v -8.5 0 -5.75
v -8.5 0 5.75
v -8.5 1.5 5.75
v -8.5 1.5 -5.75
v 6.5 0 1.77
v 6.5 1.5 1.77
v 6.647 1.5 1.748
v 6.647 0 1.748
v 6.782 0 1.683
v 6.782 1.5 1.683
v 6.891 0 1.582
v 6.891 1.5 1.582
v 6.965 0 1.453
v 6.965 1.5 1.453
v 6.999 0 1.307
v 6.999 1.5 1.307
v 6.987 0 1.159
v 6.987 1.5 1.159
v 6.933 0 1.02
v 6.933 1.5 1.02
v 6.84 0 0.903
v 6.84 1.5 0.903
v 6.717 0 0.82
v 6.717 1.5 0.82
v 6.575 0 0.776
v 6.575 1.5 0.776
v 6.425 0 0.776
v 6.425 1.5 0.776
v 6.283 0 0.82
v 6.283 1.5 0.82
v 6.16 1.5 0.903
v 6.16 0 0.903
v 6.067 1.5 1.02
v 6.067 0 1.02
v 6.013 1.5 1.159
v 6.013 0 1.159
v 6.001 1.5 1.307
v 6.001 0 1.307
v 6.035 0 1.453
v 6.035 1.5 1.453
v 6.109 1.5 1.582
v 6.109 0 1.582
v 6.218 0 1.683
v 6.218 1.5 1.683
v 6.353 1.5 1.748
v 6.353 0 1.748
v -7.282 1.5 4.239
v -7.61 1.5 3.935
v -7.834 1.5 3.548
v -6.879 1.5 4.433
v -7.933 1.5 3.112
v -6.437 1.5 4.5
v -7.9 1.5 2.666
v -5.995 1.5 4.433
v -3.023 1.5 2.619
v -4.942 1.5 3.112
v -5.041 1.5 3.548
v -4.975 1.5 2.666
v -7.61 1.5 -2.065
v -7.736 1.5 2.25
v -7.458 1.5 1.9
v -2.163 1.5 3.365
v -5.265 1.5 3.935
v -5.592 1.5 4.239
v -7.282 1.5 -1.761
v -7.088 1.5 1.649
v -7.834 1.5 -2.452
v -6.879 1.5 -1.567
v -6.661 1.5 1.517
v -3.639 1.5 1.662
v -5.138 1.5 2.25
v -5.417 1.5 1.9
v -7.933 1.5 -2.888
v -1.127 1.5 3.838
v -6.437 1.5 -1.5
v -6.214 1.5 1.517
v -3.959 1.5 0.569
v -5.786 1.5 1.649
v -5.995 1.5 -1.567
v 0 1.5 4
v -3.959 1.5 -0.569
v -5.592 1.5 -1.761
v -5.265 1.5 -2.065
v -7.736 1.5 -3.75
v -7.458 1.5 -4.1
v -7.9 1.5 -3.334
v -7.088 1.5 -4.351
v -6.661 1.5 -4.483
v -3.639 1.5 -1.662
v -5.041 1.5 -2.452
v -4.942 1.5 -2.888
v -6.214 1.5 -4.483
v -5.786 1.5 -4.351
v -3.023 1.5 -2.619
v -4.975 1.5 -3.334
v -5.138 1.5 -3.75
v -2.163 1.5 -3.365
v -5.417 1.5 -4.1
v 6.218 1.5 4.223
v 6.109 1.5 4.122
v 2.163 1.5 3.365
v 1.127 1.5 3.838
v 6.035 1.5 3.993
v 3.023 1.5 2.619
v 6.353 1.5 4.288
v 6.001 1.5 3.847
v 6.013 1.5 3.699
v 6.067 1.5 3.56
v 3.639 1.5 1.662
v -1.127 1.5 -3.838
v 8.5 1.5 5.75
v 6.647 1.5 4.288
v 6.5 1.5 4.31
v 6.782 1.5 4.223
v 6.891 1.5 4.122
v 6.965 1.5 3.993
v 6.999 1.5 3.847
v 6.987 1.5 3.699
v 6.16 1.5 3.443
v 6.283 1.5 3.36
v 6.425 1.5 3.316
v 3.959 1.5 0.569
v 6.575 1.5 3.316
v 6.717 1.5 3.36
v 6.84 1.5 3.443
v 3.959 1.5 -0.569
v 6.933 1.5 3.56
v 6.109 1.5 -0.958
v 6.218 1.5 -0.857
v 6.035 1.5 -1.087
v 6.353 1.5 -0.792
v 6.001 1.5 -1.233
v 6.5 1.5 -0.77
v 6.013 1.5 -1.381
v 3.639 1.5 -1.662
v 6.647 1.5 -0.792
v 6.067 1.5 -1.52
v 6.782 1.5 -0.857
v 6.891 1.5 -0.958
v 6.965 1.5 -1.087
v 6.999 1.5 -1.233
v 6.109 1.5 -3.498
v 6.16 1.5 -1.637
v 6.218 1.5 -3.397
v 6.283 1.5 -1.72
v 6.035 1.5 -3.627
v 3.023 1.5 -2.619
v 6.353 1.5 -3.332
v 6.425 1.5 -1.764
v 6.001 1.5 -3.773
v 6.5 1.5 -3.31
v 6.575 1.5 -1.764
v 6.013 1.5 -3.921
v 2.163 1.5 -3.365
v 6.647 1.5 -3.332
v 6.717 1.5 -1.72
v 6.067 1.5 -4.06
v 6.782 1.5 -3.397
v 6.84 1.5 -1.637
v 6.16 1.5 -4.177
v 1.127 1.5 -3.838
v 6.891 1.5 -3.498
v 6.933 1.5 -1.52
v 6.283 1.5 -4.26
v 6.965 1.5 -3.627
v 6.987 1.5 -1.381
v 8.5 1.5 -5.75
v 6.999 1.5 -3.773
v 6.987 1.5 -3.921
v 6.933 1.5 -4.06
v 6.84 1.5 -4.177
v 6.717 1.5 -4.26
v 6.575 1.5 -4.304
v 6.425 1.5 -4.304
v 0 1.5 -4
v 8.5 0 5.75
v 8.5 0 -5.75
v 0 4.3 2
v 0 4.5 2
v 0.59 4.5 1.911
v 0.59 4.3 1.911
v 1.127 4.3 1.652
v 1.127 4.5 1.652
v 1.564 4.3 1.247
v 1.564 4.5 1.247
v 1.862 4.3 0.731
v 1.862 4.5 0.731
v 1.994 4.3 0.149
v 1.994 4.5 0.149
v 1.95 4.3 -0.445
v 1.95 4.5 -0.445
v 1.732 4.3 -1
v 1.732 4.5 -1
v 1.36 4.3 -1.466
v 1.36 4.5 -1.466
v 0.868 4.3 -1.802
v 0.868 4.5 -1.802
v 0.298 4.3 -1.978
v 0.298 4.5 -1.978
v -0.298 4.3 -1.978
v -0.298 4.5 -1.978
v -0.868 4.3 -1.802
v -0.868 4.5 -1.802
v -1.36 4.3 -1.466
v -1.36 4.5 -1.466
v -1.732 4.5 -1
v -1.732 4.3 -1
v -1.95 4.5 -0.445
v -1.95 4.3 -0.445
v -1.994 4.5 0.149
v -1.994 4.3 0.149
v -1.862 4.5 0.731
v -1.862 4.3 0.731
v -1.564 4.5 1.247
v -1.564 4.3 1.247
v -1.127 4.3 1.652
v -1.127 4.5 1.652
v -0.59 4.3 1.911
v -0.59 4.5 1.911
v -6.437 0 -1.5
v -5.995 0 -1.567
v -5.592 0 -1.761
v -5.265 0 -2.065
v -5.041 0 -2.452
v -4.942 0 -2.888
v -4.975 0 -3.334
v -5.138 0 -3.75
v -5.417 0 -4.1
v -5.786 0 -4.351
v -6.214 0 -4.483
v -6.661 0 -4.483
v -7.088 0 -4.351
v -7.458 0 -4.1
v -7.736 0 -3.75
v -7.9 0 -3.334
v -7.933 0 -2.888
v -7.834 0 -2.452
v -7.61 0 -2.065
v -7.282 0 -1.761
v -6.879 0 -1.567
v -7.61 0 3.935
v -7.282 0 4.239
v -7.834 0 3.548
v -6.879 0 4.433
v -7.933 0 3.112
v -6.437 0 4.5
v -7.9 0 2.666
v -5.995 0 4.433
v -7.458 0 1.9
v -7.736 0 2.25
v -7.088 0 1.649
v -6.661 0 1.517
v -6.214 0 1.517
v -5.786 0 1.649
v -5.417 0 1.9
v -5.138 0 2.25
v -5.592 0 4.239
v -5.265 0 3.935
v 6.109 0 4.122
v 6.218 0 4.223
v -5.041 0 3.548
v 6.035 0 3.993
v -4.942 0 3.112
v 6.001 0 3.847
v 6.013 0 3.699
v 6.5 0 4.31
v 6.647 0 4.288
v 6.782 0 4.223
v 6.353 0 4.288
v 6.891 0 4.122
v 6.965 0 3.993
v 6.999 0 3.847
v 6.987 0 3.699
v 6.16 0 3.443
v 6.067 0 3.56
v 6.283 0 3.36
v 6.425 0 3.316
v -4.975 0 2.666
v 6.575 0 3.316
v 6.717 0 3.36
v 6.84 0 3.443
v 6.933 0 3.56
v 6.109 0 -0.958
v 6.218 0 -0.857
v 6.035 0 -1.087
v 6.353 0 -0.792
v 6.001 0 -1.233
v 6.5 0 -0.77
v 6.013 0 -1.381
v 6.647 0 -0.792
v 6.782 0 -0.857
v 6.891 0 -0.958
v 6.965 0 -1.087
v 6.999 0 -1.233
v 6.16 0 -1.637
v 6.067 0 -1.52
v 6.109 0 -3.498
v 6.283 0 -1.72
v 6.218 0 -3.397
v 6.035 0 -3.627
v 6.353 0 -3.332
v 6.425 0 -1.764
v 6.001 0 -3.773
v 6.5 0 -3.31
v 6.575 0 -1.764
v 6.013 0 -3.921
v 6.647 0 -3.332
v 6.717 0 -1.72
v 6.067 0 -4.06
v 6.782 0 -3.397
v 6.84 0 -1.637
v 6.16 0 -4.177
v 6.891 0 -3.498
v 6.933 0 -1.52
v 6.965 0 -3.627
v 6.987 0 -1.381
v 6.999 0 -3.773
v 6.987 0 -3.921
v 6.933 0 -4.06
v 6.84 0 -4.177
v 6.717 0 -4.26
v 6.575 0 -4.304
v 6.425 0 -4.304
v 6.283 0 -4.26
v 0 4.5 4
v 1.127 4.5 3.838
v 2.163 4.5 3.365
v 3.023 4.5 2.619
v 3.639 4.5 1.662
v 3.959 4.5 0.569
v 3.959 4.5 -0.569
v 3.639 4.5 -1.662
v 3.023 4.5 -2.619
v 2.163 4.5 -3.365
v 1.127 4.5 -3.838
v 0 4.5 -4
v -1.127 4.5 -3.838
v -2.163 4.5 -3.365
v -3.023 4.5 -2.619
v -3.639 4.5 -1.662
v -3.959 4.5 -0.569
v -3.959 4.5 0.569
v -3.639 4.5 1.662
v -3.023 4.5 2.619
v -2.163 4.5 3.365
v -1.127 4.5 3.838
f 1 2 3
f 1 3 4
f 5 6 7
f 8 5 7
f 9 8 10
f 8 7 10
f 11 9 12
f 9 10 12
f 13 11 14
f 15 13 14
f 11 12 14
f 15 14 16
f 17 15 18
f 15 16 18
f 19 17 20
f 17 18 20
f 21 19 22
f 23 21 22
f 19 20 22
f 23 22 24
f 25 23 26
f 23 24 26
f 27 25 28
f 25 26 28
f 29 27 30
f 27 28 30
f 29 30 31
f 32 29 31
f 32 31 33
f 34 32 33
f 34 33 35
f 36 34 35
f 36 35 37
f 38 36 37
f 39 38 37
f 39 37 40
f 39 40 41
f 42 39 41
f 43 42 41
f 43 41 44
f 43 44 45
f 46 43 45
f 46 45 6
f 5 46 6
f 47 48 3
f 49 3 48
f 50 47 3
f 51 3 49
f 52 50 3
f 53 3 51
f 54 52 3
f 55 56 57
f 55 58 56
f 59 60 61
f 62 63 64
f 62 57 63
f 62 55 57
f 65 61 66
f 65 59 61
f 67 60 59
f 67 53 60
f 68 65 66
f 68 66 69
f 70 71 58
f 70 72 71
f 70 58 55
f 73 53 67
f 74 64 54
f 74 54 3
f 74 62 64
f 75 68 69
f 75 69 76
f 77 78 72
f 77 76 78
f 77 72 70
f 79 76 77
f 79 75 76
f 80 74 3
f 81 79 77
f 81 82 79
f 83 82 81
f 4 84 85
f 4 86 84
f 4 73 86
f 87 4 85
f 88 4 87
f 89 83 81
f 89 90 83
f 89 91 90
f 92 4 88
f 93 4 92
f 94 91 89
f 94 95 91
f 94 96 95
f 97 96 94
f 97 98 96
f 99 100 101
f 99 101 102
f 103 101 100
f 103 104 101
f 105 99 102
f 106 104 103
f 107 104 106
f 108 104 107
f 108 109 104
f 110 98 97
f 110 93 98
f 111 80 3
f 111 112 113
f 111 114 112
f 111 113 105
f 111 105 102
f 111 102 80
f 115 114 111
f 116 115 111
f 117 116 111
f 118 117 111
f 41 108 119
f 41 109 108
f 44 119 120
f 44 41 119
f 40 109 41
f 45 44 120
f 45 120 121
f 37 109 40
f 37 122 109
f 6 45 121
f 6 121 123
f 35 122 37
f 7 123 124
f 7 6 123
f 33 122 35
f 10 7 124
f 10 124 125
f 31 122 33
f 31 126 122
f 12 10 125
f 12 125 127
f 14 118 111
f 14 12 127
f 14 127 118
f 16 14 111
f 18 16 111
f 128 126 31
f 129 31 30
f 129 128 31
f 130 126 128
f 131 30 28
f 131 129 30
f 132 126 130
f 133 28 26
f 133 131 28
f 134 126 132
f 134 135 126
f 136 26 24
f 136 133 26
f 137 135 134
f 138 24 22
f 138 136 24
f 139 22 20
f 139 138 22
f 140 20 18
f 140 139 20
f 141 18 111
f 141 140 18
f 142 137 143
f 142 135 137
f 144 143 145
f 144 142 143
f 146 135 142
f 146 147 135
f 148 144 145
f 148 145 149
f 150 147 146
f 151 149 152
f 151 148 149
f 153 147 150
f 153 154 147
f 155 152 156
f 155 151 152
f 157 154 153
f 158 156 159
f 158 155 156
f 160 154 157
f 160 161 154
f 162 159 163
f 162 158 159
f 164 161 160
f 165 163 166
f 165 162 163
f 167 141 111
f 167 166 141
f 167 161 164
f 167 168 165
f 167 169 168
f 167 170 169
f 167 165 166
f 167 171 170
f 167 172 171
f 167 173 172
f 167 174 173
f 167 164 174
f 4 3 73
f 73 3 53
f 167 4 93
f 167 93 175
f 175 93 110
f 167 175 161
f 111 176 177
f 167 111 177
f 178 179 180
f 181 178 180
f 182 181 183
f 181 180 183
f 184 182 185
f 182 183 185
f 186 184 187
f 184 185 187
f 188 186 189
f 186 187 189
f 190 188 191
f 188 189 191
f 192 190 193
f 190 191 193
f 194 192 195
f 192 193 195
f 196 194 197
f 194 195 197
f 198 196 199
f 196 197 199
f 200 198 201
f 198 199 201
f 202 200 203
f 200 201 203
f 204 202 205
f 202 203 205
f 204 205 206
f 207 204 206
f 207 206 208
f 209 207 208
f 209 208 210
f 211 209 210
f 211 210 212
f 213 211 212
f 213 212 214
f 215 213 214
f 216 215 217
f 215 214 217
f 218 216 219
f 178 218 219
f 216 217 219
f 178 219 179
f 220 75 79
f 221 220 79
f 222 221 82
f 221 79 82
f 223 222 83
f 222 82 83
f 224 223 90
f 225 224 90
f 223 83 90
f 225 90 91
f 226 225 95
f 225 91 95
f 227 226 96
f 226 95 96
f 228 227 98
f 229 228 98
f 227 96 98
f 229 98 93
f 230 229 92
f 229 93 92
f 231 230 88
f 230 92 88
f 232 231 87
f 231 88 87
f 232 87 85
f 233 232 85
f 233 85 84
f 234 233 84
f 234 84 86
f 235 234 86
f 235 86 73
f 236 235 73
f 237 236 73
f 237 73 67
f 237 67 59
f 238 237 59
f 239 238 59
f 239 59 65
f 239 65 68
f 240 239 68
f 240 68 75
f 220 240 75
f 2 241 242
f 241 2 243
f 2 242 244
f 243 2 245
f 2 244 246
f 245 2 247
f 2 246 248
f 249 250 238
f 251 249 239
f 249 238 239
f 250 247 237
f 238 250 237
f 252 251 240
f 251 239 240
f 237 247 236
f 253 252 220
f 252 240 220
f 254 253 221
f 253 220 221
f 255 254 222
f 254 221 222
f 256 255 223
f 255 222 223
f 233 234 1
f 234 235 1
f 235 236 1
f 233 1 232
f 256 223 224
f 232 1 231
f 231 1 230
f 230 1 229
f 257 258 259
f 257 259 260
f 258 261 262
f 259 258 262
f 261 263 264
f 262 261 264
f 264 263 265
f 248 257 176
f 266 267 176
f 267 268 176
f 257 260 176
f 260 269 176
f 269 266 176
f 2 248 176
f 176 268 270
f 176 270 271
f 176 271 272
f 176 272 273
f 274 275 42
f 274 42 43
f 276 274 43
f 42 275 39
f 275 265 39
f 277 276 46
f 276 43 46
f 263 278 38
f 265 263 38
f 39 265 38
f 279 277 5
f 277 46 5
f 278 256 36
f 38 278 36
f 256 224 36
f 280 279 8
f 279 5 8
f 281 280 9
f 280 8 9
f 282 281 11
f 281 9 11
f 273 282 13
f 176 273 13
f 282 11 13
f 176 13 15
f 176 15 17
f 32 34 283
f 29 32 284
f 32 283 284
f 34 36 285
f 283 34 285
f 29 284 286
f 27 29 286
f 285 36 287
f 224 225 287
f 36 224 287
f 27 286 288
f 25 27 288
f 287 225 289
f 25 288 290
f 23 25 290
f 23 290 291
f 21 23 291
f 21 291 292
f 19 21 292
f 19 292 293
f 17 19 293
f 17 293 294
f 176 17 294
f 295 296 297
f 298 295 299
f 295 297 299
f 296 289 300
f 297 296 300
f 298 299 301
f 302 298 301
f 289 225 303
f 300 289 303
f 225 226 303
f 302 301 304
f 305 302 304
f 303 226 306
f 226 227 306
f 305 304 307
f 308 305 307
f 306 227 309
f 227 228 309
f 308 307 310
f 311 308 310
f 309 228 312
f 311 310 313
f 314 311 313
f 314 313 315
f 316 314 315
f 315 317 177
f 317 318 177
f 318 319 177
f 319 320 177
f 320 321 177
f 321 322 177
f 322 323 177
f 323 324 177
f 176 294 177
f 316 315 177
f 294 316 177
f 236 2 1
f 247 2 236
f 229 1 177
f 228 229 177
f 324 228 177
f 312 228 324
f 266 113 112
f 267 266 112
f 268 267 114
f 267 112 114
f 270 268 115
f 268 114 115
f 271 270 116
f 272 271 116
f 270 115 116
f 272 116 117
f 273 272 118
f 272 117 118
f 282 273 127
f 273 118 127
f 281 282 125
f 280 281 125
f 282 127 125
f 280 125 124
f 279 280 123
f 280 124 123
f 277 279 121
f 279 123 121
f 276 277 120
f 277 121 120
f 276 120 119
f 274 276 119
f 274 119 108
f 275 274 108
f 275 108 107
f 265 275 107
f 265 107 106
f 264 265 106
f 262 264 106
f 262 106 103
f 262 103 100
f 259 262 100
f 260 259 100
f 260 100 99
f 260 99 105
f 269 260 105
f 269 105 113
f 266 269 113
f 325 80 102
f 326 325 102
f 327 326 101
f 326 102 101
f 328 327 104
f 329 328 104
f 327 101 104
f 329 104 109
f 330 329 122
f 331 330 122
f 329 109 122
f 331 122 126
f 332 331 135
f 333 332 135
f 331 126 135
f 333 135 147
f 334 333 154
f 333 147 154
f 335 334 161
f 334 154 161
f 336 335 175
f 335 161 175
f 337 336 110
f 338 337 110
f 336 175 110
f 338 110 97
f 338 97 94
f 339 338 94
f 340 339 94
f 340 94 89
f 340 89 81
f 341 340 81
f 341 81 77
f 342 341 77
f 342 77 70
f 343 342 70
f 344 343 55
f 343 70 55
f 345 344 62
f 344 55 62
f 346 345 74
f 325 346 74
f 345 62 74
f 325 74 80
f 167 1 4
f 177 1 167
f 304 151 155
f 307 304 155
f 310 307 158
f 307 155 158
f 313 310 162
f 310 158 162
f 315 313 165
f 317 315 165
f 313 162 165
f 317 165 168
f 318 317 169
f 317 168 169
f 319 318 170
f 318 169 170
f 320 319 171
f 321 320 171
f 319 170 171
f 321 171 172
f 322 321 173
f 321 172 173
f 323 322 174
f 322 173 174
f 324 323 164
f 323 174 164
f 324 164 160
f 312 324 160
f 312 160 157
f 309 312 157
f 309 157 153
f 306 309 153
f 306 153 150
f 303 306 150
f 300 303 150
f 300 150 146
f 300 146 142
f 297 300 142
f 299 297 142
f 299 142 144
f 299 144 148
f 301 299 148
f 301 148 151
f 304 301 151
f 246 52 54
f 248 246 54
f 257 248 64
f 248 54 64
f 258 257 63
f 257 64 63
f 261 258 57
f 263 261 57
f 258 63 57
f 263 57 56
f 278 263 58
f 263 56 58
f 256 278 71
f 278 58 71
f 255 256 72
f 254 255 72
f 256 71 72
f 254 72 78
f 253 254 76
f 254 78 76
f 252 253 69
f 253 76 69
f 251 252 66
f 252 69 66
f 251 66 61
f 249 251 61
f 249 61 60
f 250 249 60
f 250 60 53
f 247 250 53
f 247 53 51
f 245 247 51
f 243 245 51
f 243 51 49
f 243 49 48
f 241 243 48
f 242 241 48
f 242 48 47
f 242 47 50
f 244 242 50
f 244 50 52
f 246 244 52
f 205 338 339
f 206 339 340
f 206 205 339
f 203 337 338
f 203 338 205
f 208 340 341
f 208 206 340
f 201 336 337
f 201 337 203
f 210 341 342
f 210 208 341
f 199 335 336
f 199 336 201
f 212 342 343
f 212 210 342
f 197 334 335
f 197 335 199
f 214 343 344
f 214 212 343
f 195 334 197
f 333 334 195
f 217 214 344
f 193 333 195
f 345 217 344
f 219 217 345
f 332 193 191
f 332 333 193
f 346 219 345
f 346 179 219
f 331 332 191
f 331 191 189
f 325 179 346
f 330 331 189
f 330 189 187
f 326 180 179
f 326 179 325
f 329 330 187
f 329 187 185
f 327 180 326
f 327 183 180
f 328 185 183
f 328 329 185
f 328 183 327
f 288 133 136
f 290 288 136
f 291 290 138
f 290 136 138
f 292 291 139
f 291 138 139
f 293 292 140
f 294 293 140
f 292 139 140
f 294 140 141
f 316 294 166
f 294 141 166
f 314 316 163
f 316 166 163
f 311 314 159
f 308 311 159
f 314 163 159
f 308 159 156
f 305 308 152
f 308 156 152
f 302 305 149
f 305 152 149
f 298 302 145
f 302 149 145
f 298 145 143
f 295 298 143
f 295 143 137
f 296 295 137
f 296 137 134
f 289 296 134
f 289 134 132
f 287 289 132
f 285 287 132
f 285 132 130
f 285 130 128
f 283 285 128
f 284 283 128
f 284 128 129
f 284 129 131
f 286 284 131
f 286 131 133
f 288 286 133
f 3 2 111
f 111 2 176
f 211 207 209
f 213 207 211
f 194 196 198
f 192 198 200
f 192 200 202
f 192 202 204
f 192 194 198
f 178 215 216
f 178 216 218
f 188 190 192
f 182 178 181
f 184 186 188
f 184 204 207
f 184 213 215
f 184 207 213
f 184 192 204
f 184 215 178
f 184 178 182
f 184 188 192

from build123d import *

# Parameters (mm, degrees)
SKETCH_1_W          = 17
SKETCH_1_H          = 11.5
EXTRUDE_1_DEPTH     = 1.5
SKETCH_2_R          = 4
EXTRUDE_2_DEPTH     = 3
SKETCH_3_R          = 2
CUT_EXTRUDE_1_DEPTH = 0.2
SKETCH_4_R          = 0.5
SKETCH_4_R_2        = 1.5
CUT_EXTRUDE_2_DEPTH = 11.69170239


with BuildPart() as part:
    # Эскиз1 → Бобышка-Вытянуть1 (new body)
    with BuildSketch(Plane(origin=(0, 0, 0), x_dir=(1, 0, 0), z_dir=(0, 1, 0))):
        Rectangle(SKETCH_1_W, SKETCH_1_H)
    extrude(amount=EXTRUDE_1_DEPTH)

    # Эскиз2 → Бобышка-Вытянуть2 (add)
    with BuildSketch(Plane(origin=(0, 1.5, 0), x_dir=(1, 0, 0), z_dir=(0, 1, 0))):
        with Locations(Location((0, 0, 0), (0, 0, 270))):
            Circle(SKETCH_2_R)
    extrude(amount=EXTRUDE_2_DEPTH)

    # Эскиз3 → Вырез-Вытянуть1 (cut)
    with BuildSketch(Plane(origin=(0, 4.5, 0), x_dir=(1, 0, 0), z_dir=(0, 1, 0))):
        with Locations(Location((0, 0, 0), (0, 0, 270))):
            Circle(SKETCH_3_R)
    extrude(amount=-CUT_EXTRUDE_1_DEPTH, mode=Mode.SUBTRACT)

    # Эскиз4 → Вырез-Вытянуть2 (cut, through all)
    with BuildSketch(Plane(origin=(0, 1.5, 0), x_dir=(1, 0, 0), z_dir=(0, 1, 0))):
        with Locations(Location((6.5, 3.81, 0), (0, 0, 270))):
            Circle(SKETCH_4_R)
        with Locations(Location((6.5, 1.27, 0), (0, 0, 270))):
            Circle(SKETCH_4_R)
        with Locations(Location((6.5, -1.27, 0), (0, 0, 270))):
            Circle(SKETCH_4_R)
        with Locations(Location((6.5, -3.81, 0), (0, 0, 270))):
            Circle(SKETCH_4_R)
        with Locations(Location((-6.43732089, 3, 0), (0, 0, 270))):
            Circle(SKETCH_4_R_2)
        with Locations(Location((-6.43732089, -3, 0), (0, 0, 270))):
            Circle(SKETCH_4_R_2)
    extrude(amount=-CUT_EXTRUDE_2_DEPTH, mode=Mode.SUBTRACT)


solid = part.part
